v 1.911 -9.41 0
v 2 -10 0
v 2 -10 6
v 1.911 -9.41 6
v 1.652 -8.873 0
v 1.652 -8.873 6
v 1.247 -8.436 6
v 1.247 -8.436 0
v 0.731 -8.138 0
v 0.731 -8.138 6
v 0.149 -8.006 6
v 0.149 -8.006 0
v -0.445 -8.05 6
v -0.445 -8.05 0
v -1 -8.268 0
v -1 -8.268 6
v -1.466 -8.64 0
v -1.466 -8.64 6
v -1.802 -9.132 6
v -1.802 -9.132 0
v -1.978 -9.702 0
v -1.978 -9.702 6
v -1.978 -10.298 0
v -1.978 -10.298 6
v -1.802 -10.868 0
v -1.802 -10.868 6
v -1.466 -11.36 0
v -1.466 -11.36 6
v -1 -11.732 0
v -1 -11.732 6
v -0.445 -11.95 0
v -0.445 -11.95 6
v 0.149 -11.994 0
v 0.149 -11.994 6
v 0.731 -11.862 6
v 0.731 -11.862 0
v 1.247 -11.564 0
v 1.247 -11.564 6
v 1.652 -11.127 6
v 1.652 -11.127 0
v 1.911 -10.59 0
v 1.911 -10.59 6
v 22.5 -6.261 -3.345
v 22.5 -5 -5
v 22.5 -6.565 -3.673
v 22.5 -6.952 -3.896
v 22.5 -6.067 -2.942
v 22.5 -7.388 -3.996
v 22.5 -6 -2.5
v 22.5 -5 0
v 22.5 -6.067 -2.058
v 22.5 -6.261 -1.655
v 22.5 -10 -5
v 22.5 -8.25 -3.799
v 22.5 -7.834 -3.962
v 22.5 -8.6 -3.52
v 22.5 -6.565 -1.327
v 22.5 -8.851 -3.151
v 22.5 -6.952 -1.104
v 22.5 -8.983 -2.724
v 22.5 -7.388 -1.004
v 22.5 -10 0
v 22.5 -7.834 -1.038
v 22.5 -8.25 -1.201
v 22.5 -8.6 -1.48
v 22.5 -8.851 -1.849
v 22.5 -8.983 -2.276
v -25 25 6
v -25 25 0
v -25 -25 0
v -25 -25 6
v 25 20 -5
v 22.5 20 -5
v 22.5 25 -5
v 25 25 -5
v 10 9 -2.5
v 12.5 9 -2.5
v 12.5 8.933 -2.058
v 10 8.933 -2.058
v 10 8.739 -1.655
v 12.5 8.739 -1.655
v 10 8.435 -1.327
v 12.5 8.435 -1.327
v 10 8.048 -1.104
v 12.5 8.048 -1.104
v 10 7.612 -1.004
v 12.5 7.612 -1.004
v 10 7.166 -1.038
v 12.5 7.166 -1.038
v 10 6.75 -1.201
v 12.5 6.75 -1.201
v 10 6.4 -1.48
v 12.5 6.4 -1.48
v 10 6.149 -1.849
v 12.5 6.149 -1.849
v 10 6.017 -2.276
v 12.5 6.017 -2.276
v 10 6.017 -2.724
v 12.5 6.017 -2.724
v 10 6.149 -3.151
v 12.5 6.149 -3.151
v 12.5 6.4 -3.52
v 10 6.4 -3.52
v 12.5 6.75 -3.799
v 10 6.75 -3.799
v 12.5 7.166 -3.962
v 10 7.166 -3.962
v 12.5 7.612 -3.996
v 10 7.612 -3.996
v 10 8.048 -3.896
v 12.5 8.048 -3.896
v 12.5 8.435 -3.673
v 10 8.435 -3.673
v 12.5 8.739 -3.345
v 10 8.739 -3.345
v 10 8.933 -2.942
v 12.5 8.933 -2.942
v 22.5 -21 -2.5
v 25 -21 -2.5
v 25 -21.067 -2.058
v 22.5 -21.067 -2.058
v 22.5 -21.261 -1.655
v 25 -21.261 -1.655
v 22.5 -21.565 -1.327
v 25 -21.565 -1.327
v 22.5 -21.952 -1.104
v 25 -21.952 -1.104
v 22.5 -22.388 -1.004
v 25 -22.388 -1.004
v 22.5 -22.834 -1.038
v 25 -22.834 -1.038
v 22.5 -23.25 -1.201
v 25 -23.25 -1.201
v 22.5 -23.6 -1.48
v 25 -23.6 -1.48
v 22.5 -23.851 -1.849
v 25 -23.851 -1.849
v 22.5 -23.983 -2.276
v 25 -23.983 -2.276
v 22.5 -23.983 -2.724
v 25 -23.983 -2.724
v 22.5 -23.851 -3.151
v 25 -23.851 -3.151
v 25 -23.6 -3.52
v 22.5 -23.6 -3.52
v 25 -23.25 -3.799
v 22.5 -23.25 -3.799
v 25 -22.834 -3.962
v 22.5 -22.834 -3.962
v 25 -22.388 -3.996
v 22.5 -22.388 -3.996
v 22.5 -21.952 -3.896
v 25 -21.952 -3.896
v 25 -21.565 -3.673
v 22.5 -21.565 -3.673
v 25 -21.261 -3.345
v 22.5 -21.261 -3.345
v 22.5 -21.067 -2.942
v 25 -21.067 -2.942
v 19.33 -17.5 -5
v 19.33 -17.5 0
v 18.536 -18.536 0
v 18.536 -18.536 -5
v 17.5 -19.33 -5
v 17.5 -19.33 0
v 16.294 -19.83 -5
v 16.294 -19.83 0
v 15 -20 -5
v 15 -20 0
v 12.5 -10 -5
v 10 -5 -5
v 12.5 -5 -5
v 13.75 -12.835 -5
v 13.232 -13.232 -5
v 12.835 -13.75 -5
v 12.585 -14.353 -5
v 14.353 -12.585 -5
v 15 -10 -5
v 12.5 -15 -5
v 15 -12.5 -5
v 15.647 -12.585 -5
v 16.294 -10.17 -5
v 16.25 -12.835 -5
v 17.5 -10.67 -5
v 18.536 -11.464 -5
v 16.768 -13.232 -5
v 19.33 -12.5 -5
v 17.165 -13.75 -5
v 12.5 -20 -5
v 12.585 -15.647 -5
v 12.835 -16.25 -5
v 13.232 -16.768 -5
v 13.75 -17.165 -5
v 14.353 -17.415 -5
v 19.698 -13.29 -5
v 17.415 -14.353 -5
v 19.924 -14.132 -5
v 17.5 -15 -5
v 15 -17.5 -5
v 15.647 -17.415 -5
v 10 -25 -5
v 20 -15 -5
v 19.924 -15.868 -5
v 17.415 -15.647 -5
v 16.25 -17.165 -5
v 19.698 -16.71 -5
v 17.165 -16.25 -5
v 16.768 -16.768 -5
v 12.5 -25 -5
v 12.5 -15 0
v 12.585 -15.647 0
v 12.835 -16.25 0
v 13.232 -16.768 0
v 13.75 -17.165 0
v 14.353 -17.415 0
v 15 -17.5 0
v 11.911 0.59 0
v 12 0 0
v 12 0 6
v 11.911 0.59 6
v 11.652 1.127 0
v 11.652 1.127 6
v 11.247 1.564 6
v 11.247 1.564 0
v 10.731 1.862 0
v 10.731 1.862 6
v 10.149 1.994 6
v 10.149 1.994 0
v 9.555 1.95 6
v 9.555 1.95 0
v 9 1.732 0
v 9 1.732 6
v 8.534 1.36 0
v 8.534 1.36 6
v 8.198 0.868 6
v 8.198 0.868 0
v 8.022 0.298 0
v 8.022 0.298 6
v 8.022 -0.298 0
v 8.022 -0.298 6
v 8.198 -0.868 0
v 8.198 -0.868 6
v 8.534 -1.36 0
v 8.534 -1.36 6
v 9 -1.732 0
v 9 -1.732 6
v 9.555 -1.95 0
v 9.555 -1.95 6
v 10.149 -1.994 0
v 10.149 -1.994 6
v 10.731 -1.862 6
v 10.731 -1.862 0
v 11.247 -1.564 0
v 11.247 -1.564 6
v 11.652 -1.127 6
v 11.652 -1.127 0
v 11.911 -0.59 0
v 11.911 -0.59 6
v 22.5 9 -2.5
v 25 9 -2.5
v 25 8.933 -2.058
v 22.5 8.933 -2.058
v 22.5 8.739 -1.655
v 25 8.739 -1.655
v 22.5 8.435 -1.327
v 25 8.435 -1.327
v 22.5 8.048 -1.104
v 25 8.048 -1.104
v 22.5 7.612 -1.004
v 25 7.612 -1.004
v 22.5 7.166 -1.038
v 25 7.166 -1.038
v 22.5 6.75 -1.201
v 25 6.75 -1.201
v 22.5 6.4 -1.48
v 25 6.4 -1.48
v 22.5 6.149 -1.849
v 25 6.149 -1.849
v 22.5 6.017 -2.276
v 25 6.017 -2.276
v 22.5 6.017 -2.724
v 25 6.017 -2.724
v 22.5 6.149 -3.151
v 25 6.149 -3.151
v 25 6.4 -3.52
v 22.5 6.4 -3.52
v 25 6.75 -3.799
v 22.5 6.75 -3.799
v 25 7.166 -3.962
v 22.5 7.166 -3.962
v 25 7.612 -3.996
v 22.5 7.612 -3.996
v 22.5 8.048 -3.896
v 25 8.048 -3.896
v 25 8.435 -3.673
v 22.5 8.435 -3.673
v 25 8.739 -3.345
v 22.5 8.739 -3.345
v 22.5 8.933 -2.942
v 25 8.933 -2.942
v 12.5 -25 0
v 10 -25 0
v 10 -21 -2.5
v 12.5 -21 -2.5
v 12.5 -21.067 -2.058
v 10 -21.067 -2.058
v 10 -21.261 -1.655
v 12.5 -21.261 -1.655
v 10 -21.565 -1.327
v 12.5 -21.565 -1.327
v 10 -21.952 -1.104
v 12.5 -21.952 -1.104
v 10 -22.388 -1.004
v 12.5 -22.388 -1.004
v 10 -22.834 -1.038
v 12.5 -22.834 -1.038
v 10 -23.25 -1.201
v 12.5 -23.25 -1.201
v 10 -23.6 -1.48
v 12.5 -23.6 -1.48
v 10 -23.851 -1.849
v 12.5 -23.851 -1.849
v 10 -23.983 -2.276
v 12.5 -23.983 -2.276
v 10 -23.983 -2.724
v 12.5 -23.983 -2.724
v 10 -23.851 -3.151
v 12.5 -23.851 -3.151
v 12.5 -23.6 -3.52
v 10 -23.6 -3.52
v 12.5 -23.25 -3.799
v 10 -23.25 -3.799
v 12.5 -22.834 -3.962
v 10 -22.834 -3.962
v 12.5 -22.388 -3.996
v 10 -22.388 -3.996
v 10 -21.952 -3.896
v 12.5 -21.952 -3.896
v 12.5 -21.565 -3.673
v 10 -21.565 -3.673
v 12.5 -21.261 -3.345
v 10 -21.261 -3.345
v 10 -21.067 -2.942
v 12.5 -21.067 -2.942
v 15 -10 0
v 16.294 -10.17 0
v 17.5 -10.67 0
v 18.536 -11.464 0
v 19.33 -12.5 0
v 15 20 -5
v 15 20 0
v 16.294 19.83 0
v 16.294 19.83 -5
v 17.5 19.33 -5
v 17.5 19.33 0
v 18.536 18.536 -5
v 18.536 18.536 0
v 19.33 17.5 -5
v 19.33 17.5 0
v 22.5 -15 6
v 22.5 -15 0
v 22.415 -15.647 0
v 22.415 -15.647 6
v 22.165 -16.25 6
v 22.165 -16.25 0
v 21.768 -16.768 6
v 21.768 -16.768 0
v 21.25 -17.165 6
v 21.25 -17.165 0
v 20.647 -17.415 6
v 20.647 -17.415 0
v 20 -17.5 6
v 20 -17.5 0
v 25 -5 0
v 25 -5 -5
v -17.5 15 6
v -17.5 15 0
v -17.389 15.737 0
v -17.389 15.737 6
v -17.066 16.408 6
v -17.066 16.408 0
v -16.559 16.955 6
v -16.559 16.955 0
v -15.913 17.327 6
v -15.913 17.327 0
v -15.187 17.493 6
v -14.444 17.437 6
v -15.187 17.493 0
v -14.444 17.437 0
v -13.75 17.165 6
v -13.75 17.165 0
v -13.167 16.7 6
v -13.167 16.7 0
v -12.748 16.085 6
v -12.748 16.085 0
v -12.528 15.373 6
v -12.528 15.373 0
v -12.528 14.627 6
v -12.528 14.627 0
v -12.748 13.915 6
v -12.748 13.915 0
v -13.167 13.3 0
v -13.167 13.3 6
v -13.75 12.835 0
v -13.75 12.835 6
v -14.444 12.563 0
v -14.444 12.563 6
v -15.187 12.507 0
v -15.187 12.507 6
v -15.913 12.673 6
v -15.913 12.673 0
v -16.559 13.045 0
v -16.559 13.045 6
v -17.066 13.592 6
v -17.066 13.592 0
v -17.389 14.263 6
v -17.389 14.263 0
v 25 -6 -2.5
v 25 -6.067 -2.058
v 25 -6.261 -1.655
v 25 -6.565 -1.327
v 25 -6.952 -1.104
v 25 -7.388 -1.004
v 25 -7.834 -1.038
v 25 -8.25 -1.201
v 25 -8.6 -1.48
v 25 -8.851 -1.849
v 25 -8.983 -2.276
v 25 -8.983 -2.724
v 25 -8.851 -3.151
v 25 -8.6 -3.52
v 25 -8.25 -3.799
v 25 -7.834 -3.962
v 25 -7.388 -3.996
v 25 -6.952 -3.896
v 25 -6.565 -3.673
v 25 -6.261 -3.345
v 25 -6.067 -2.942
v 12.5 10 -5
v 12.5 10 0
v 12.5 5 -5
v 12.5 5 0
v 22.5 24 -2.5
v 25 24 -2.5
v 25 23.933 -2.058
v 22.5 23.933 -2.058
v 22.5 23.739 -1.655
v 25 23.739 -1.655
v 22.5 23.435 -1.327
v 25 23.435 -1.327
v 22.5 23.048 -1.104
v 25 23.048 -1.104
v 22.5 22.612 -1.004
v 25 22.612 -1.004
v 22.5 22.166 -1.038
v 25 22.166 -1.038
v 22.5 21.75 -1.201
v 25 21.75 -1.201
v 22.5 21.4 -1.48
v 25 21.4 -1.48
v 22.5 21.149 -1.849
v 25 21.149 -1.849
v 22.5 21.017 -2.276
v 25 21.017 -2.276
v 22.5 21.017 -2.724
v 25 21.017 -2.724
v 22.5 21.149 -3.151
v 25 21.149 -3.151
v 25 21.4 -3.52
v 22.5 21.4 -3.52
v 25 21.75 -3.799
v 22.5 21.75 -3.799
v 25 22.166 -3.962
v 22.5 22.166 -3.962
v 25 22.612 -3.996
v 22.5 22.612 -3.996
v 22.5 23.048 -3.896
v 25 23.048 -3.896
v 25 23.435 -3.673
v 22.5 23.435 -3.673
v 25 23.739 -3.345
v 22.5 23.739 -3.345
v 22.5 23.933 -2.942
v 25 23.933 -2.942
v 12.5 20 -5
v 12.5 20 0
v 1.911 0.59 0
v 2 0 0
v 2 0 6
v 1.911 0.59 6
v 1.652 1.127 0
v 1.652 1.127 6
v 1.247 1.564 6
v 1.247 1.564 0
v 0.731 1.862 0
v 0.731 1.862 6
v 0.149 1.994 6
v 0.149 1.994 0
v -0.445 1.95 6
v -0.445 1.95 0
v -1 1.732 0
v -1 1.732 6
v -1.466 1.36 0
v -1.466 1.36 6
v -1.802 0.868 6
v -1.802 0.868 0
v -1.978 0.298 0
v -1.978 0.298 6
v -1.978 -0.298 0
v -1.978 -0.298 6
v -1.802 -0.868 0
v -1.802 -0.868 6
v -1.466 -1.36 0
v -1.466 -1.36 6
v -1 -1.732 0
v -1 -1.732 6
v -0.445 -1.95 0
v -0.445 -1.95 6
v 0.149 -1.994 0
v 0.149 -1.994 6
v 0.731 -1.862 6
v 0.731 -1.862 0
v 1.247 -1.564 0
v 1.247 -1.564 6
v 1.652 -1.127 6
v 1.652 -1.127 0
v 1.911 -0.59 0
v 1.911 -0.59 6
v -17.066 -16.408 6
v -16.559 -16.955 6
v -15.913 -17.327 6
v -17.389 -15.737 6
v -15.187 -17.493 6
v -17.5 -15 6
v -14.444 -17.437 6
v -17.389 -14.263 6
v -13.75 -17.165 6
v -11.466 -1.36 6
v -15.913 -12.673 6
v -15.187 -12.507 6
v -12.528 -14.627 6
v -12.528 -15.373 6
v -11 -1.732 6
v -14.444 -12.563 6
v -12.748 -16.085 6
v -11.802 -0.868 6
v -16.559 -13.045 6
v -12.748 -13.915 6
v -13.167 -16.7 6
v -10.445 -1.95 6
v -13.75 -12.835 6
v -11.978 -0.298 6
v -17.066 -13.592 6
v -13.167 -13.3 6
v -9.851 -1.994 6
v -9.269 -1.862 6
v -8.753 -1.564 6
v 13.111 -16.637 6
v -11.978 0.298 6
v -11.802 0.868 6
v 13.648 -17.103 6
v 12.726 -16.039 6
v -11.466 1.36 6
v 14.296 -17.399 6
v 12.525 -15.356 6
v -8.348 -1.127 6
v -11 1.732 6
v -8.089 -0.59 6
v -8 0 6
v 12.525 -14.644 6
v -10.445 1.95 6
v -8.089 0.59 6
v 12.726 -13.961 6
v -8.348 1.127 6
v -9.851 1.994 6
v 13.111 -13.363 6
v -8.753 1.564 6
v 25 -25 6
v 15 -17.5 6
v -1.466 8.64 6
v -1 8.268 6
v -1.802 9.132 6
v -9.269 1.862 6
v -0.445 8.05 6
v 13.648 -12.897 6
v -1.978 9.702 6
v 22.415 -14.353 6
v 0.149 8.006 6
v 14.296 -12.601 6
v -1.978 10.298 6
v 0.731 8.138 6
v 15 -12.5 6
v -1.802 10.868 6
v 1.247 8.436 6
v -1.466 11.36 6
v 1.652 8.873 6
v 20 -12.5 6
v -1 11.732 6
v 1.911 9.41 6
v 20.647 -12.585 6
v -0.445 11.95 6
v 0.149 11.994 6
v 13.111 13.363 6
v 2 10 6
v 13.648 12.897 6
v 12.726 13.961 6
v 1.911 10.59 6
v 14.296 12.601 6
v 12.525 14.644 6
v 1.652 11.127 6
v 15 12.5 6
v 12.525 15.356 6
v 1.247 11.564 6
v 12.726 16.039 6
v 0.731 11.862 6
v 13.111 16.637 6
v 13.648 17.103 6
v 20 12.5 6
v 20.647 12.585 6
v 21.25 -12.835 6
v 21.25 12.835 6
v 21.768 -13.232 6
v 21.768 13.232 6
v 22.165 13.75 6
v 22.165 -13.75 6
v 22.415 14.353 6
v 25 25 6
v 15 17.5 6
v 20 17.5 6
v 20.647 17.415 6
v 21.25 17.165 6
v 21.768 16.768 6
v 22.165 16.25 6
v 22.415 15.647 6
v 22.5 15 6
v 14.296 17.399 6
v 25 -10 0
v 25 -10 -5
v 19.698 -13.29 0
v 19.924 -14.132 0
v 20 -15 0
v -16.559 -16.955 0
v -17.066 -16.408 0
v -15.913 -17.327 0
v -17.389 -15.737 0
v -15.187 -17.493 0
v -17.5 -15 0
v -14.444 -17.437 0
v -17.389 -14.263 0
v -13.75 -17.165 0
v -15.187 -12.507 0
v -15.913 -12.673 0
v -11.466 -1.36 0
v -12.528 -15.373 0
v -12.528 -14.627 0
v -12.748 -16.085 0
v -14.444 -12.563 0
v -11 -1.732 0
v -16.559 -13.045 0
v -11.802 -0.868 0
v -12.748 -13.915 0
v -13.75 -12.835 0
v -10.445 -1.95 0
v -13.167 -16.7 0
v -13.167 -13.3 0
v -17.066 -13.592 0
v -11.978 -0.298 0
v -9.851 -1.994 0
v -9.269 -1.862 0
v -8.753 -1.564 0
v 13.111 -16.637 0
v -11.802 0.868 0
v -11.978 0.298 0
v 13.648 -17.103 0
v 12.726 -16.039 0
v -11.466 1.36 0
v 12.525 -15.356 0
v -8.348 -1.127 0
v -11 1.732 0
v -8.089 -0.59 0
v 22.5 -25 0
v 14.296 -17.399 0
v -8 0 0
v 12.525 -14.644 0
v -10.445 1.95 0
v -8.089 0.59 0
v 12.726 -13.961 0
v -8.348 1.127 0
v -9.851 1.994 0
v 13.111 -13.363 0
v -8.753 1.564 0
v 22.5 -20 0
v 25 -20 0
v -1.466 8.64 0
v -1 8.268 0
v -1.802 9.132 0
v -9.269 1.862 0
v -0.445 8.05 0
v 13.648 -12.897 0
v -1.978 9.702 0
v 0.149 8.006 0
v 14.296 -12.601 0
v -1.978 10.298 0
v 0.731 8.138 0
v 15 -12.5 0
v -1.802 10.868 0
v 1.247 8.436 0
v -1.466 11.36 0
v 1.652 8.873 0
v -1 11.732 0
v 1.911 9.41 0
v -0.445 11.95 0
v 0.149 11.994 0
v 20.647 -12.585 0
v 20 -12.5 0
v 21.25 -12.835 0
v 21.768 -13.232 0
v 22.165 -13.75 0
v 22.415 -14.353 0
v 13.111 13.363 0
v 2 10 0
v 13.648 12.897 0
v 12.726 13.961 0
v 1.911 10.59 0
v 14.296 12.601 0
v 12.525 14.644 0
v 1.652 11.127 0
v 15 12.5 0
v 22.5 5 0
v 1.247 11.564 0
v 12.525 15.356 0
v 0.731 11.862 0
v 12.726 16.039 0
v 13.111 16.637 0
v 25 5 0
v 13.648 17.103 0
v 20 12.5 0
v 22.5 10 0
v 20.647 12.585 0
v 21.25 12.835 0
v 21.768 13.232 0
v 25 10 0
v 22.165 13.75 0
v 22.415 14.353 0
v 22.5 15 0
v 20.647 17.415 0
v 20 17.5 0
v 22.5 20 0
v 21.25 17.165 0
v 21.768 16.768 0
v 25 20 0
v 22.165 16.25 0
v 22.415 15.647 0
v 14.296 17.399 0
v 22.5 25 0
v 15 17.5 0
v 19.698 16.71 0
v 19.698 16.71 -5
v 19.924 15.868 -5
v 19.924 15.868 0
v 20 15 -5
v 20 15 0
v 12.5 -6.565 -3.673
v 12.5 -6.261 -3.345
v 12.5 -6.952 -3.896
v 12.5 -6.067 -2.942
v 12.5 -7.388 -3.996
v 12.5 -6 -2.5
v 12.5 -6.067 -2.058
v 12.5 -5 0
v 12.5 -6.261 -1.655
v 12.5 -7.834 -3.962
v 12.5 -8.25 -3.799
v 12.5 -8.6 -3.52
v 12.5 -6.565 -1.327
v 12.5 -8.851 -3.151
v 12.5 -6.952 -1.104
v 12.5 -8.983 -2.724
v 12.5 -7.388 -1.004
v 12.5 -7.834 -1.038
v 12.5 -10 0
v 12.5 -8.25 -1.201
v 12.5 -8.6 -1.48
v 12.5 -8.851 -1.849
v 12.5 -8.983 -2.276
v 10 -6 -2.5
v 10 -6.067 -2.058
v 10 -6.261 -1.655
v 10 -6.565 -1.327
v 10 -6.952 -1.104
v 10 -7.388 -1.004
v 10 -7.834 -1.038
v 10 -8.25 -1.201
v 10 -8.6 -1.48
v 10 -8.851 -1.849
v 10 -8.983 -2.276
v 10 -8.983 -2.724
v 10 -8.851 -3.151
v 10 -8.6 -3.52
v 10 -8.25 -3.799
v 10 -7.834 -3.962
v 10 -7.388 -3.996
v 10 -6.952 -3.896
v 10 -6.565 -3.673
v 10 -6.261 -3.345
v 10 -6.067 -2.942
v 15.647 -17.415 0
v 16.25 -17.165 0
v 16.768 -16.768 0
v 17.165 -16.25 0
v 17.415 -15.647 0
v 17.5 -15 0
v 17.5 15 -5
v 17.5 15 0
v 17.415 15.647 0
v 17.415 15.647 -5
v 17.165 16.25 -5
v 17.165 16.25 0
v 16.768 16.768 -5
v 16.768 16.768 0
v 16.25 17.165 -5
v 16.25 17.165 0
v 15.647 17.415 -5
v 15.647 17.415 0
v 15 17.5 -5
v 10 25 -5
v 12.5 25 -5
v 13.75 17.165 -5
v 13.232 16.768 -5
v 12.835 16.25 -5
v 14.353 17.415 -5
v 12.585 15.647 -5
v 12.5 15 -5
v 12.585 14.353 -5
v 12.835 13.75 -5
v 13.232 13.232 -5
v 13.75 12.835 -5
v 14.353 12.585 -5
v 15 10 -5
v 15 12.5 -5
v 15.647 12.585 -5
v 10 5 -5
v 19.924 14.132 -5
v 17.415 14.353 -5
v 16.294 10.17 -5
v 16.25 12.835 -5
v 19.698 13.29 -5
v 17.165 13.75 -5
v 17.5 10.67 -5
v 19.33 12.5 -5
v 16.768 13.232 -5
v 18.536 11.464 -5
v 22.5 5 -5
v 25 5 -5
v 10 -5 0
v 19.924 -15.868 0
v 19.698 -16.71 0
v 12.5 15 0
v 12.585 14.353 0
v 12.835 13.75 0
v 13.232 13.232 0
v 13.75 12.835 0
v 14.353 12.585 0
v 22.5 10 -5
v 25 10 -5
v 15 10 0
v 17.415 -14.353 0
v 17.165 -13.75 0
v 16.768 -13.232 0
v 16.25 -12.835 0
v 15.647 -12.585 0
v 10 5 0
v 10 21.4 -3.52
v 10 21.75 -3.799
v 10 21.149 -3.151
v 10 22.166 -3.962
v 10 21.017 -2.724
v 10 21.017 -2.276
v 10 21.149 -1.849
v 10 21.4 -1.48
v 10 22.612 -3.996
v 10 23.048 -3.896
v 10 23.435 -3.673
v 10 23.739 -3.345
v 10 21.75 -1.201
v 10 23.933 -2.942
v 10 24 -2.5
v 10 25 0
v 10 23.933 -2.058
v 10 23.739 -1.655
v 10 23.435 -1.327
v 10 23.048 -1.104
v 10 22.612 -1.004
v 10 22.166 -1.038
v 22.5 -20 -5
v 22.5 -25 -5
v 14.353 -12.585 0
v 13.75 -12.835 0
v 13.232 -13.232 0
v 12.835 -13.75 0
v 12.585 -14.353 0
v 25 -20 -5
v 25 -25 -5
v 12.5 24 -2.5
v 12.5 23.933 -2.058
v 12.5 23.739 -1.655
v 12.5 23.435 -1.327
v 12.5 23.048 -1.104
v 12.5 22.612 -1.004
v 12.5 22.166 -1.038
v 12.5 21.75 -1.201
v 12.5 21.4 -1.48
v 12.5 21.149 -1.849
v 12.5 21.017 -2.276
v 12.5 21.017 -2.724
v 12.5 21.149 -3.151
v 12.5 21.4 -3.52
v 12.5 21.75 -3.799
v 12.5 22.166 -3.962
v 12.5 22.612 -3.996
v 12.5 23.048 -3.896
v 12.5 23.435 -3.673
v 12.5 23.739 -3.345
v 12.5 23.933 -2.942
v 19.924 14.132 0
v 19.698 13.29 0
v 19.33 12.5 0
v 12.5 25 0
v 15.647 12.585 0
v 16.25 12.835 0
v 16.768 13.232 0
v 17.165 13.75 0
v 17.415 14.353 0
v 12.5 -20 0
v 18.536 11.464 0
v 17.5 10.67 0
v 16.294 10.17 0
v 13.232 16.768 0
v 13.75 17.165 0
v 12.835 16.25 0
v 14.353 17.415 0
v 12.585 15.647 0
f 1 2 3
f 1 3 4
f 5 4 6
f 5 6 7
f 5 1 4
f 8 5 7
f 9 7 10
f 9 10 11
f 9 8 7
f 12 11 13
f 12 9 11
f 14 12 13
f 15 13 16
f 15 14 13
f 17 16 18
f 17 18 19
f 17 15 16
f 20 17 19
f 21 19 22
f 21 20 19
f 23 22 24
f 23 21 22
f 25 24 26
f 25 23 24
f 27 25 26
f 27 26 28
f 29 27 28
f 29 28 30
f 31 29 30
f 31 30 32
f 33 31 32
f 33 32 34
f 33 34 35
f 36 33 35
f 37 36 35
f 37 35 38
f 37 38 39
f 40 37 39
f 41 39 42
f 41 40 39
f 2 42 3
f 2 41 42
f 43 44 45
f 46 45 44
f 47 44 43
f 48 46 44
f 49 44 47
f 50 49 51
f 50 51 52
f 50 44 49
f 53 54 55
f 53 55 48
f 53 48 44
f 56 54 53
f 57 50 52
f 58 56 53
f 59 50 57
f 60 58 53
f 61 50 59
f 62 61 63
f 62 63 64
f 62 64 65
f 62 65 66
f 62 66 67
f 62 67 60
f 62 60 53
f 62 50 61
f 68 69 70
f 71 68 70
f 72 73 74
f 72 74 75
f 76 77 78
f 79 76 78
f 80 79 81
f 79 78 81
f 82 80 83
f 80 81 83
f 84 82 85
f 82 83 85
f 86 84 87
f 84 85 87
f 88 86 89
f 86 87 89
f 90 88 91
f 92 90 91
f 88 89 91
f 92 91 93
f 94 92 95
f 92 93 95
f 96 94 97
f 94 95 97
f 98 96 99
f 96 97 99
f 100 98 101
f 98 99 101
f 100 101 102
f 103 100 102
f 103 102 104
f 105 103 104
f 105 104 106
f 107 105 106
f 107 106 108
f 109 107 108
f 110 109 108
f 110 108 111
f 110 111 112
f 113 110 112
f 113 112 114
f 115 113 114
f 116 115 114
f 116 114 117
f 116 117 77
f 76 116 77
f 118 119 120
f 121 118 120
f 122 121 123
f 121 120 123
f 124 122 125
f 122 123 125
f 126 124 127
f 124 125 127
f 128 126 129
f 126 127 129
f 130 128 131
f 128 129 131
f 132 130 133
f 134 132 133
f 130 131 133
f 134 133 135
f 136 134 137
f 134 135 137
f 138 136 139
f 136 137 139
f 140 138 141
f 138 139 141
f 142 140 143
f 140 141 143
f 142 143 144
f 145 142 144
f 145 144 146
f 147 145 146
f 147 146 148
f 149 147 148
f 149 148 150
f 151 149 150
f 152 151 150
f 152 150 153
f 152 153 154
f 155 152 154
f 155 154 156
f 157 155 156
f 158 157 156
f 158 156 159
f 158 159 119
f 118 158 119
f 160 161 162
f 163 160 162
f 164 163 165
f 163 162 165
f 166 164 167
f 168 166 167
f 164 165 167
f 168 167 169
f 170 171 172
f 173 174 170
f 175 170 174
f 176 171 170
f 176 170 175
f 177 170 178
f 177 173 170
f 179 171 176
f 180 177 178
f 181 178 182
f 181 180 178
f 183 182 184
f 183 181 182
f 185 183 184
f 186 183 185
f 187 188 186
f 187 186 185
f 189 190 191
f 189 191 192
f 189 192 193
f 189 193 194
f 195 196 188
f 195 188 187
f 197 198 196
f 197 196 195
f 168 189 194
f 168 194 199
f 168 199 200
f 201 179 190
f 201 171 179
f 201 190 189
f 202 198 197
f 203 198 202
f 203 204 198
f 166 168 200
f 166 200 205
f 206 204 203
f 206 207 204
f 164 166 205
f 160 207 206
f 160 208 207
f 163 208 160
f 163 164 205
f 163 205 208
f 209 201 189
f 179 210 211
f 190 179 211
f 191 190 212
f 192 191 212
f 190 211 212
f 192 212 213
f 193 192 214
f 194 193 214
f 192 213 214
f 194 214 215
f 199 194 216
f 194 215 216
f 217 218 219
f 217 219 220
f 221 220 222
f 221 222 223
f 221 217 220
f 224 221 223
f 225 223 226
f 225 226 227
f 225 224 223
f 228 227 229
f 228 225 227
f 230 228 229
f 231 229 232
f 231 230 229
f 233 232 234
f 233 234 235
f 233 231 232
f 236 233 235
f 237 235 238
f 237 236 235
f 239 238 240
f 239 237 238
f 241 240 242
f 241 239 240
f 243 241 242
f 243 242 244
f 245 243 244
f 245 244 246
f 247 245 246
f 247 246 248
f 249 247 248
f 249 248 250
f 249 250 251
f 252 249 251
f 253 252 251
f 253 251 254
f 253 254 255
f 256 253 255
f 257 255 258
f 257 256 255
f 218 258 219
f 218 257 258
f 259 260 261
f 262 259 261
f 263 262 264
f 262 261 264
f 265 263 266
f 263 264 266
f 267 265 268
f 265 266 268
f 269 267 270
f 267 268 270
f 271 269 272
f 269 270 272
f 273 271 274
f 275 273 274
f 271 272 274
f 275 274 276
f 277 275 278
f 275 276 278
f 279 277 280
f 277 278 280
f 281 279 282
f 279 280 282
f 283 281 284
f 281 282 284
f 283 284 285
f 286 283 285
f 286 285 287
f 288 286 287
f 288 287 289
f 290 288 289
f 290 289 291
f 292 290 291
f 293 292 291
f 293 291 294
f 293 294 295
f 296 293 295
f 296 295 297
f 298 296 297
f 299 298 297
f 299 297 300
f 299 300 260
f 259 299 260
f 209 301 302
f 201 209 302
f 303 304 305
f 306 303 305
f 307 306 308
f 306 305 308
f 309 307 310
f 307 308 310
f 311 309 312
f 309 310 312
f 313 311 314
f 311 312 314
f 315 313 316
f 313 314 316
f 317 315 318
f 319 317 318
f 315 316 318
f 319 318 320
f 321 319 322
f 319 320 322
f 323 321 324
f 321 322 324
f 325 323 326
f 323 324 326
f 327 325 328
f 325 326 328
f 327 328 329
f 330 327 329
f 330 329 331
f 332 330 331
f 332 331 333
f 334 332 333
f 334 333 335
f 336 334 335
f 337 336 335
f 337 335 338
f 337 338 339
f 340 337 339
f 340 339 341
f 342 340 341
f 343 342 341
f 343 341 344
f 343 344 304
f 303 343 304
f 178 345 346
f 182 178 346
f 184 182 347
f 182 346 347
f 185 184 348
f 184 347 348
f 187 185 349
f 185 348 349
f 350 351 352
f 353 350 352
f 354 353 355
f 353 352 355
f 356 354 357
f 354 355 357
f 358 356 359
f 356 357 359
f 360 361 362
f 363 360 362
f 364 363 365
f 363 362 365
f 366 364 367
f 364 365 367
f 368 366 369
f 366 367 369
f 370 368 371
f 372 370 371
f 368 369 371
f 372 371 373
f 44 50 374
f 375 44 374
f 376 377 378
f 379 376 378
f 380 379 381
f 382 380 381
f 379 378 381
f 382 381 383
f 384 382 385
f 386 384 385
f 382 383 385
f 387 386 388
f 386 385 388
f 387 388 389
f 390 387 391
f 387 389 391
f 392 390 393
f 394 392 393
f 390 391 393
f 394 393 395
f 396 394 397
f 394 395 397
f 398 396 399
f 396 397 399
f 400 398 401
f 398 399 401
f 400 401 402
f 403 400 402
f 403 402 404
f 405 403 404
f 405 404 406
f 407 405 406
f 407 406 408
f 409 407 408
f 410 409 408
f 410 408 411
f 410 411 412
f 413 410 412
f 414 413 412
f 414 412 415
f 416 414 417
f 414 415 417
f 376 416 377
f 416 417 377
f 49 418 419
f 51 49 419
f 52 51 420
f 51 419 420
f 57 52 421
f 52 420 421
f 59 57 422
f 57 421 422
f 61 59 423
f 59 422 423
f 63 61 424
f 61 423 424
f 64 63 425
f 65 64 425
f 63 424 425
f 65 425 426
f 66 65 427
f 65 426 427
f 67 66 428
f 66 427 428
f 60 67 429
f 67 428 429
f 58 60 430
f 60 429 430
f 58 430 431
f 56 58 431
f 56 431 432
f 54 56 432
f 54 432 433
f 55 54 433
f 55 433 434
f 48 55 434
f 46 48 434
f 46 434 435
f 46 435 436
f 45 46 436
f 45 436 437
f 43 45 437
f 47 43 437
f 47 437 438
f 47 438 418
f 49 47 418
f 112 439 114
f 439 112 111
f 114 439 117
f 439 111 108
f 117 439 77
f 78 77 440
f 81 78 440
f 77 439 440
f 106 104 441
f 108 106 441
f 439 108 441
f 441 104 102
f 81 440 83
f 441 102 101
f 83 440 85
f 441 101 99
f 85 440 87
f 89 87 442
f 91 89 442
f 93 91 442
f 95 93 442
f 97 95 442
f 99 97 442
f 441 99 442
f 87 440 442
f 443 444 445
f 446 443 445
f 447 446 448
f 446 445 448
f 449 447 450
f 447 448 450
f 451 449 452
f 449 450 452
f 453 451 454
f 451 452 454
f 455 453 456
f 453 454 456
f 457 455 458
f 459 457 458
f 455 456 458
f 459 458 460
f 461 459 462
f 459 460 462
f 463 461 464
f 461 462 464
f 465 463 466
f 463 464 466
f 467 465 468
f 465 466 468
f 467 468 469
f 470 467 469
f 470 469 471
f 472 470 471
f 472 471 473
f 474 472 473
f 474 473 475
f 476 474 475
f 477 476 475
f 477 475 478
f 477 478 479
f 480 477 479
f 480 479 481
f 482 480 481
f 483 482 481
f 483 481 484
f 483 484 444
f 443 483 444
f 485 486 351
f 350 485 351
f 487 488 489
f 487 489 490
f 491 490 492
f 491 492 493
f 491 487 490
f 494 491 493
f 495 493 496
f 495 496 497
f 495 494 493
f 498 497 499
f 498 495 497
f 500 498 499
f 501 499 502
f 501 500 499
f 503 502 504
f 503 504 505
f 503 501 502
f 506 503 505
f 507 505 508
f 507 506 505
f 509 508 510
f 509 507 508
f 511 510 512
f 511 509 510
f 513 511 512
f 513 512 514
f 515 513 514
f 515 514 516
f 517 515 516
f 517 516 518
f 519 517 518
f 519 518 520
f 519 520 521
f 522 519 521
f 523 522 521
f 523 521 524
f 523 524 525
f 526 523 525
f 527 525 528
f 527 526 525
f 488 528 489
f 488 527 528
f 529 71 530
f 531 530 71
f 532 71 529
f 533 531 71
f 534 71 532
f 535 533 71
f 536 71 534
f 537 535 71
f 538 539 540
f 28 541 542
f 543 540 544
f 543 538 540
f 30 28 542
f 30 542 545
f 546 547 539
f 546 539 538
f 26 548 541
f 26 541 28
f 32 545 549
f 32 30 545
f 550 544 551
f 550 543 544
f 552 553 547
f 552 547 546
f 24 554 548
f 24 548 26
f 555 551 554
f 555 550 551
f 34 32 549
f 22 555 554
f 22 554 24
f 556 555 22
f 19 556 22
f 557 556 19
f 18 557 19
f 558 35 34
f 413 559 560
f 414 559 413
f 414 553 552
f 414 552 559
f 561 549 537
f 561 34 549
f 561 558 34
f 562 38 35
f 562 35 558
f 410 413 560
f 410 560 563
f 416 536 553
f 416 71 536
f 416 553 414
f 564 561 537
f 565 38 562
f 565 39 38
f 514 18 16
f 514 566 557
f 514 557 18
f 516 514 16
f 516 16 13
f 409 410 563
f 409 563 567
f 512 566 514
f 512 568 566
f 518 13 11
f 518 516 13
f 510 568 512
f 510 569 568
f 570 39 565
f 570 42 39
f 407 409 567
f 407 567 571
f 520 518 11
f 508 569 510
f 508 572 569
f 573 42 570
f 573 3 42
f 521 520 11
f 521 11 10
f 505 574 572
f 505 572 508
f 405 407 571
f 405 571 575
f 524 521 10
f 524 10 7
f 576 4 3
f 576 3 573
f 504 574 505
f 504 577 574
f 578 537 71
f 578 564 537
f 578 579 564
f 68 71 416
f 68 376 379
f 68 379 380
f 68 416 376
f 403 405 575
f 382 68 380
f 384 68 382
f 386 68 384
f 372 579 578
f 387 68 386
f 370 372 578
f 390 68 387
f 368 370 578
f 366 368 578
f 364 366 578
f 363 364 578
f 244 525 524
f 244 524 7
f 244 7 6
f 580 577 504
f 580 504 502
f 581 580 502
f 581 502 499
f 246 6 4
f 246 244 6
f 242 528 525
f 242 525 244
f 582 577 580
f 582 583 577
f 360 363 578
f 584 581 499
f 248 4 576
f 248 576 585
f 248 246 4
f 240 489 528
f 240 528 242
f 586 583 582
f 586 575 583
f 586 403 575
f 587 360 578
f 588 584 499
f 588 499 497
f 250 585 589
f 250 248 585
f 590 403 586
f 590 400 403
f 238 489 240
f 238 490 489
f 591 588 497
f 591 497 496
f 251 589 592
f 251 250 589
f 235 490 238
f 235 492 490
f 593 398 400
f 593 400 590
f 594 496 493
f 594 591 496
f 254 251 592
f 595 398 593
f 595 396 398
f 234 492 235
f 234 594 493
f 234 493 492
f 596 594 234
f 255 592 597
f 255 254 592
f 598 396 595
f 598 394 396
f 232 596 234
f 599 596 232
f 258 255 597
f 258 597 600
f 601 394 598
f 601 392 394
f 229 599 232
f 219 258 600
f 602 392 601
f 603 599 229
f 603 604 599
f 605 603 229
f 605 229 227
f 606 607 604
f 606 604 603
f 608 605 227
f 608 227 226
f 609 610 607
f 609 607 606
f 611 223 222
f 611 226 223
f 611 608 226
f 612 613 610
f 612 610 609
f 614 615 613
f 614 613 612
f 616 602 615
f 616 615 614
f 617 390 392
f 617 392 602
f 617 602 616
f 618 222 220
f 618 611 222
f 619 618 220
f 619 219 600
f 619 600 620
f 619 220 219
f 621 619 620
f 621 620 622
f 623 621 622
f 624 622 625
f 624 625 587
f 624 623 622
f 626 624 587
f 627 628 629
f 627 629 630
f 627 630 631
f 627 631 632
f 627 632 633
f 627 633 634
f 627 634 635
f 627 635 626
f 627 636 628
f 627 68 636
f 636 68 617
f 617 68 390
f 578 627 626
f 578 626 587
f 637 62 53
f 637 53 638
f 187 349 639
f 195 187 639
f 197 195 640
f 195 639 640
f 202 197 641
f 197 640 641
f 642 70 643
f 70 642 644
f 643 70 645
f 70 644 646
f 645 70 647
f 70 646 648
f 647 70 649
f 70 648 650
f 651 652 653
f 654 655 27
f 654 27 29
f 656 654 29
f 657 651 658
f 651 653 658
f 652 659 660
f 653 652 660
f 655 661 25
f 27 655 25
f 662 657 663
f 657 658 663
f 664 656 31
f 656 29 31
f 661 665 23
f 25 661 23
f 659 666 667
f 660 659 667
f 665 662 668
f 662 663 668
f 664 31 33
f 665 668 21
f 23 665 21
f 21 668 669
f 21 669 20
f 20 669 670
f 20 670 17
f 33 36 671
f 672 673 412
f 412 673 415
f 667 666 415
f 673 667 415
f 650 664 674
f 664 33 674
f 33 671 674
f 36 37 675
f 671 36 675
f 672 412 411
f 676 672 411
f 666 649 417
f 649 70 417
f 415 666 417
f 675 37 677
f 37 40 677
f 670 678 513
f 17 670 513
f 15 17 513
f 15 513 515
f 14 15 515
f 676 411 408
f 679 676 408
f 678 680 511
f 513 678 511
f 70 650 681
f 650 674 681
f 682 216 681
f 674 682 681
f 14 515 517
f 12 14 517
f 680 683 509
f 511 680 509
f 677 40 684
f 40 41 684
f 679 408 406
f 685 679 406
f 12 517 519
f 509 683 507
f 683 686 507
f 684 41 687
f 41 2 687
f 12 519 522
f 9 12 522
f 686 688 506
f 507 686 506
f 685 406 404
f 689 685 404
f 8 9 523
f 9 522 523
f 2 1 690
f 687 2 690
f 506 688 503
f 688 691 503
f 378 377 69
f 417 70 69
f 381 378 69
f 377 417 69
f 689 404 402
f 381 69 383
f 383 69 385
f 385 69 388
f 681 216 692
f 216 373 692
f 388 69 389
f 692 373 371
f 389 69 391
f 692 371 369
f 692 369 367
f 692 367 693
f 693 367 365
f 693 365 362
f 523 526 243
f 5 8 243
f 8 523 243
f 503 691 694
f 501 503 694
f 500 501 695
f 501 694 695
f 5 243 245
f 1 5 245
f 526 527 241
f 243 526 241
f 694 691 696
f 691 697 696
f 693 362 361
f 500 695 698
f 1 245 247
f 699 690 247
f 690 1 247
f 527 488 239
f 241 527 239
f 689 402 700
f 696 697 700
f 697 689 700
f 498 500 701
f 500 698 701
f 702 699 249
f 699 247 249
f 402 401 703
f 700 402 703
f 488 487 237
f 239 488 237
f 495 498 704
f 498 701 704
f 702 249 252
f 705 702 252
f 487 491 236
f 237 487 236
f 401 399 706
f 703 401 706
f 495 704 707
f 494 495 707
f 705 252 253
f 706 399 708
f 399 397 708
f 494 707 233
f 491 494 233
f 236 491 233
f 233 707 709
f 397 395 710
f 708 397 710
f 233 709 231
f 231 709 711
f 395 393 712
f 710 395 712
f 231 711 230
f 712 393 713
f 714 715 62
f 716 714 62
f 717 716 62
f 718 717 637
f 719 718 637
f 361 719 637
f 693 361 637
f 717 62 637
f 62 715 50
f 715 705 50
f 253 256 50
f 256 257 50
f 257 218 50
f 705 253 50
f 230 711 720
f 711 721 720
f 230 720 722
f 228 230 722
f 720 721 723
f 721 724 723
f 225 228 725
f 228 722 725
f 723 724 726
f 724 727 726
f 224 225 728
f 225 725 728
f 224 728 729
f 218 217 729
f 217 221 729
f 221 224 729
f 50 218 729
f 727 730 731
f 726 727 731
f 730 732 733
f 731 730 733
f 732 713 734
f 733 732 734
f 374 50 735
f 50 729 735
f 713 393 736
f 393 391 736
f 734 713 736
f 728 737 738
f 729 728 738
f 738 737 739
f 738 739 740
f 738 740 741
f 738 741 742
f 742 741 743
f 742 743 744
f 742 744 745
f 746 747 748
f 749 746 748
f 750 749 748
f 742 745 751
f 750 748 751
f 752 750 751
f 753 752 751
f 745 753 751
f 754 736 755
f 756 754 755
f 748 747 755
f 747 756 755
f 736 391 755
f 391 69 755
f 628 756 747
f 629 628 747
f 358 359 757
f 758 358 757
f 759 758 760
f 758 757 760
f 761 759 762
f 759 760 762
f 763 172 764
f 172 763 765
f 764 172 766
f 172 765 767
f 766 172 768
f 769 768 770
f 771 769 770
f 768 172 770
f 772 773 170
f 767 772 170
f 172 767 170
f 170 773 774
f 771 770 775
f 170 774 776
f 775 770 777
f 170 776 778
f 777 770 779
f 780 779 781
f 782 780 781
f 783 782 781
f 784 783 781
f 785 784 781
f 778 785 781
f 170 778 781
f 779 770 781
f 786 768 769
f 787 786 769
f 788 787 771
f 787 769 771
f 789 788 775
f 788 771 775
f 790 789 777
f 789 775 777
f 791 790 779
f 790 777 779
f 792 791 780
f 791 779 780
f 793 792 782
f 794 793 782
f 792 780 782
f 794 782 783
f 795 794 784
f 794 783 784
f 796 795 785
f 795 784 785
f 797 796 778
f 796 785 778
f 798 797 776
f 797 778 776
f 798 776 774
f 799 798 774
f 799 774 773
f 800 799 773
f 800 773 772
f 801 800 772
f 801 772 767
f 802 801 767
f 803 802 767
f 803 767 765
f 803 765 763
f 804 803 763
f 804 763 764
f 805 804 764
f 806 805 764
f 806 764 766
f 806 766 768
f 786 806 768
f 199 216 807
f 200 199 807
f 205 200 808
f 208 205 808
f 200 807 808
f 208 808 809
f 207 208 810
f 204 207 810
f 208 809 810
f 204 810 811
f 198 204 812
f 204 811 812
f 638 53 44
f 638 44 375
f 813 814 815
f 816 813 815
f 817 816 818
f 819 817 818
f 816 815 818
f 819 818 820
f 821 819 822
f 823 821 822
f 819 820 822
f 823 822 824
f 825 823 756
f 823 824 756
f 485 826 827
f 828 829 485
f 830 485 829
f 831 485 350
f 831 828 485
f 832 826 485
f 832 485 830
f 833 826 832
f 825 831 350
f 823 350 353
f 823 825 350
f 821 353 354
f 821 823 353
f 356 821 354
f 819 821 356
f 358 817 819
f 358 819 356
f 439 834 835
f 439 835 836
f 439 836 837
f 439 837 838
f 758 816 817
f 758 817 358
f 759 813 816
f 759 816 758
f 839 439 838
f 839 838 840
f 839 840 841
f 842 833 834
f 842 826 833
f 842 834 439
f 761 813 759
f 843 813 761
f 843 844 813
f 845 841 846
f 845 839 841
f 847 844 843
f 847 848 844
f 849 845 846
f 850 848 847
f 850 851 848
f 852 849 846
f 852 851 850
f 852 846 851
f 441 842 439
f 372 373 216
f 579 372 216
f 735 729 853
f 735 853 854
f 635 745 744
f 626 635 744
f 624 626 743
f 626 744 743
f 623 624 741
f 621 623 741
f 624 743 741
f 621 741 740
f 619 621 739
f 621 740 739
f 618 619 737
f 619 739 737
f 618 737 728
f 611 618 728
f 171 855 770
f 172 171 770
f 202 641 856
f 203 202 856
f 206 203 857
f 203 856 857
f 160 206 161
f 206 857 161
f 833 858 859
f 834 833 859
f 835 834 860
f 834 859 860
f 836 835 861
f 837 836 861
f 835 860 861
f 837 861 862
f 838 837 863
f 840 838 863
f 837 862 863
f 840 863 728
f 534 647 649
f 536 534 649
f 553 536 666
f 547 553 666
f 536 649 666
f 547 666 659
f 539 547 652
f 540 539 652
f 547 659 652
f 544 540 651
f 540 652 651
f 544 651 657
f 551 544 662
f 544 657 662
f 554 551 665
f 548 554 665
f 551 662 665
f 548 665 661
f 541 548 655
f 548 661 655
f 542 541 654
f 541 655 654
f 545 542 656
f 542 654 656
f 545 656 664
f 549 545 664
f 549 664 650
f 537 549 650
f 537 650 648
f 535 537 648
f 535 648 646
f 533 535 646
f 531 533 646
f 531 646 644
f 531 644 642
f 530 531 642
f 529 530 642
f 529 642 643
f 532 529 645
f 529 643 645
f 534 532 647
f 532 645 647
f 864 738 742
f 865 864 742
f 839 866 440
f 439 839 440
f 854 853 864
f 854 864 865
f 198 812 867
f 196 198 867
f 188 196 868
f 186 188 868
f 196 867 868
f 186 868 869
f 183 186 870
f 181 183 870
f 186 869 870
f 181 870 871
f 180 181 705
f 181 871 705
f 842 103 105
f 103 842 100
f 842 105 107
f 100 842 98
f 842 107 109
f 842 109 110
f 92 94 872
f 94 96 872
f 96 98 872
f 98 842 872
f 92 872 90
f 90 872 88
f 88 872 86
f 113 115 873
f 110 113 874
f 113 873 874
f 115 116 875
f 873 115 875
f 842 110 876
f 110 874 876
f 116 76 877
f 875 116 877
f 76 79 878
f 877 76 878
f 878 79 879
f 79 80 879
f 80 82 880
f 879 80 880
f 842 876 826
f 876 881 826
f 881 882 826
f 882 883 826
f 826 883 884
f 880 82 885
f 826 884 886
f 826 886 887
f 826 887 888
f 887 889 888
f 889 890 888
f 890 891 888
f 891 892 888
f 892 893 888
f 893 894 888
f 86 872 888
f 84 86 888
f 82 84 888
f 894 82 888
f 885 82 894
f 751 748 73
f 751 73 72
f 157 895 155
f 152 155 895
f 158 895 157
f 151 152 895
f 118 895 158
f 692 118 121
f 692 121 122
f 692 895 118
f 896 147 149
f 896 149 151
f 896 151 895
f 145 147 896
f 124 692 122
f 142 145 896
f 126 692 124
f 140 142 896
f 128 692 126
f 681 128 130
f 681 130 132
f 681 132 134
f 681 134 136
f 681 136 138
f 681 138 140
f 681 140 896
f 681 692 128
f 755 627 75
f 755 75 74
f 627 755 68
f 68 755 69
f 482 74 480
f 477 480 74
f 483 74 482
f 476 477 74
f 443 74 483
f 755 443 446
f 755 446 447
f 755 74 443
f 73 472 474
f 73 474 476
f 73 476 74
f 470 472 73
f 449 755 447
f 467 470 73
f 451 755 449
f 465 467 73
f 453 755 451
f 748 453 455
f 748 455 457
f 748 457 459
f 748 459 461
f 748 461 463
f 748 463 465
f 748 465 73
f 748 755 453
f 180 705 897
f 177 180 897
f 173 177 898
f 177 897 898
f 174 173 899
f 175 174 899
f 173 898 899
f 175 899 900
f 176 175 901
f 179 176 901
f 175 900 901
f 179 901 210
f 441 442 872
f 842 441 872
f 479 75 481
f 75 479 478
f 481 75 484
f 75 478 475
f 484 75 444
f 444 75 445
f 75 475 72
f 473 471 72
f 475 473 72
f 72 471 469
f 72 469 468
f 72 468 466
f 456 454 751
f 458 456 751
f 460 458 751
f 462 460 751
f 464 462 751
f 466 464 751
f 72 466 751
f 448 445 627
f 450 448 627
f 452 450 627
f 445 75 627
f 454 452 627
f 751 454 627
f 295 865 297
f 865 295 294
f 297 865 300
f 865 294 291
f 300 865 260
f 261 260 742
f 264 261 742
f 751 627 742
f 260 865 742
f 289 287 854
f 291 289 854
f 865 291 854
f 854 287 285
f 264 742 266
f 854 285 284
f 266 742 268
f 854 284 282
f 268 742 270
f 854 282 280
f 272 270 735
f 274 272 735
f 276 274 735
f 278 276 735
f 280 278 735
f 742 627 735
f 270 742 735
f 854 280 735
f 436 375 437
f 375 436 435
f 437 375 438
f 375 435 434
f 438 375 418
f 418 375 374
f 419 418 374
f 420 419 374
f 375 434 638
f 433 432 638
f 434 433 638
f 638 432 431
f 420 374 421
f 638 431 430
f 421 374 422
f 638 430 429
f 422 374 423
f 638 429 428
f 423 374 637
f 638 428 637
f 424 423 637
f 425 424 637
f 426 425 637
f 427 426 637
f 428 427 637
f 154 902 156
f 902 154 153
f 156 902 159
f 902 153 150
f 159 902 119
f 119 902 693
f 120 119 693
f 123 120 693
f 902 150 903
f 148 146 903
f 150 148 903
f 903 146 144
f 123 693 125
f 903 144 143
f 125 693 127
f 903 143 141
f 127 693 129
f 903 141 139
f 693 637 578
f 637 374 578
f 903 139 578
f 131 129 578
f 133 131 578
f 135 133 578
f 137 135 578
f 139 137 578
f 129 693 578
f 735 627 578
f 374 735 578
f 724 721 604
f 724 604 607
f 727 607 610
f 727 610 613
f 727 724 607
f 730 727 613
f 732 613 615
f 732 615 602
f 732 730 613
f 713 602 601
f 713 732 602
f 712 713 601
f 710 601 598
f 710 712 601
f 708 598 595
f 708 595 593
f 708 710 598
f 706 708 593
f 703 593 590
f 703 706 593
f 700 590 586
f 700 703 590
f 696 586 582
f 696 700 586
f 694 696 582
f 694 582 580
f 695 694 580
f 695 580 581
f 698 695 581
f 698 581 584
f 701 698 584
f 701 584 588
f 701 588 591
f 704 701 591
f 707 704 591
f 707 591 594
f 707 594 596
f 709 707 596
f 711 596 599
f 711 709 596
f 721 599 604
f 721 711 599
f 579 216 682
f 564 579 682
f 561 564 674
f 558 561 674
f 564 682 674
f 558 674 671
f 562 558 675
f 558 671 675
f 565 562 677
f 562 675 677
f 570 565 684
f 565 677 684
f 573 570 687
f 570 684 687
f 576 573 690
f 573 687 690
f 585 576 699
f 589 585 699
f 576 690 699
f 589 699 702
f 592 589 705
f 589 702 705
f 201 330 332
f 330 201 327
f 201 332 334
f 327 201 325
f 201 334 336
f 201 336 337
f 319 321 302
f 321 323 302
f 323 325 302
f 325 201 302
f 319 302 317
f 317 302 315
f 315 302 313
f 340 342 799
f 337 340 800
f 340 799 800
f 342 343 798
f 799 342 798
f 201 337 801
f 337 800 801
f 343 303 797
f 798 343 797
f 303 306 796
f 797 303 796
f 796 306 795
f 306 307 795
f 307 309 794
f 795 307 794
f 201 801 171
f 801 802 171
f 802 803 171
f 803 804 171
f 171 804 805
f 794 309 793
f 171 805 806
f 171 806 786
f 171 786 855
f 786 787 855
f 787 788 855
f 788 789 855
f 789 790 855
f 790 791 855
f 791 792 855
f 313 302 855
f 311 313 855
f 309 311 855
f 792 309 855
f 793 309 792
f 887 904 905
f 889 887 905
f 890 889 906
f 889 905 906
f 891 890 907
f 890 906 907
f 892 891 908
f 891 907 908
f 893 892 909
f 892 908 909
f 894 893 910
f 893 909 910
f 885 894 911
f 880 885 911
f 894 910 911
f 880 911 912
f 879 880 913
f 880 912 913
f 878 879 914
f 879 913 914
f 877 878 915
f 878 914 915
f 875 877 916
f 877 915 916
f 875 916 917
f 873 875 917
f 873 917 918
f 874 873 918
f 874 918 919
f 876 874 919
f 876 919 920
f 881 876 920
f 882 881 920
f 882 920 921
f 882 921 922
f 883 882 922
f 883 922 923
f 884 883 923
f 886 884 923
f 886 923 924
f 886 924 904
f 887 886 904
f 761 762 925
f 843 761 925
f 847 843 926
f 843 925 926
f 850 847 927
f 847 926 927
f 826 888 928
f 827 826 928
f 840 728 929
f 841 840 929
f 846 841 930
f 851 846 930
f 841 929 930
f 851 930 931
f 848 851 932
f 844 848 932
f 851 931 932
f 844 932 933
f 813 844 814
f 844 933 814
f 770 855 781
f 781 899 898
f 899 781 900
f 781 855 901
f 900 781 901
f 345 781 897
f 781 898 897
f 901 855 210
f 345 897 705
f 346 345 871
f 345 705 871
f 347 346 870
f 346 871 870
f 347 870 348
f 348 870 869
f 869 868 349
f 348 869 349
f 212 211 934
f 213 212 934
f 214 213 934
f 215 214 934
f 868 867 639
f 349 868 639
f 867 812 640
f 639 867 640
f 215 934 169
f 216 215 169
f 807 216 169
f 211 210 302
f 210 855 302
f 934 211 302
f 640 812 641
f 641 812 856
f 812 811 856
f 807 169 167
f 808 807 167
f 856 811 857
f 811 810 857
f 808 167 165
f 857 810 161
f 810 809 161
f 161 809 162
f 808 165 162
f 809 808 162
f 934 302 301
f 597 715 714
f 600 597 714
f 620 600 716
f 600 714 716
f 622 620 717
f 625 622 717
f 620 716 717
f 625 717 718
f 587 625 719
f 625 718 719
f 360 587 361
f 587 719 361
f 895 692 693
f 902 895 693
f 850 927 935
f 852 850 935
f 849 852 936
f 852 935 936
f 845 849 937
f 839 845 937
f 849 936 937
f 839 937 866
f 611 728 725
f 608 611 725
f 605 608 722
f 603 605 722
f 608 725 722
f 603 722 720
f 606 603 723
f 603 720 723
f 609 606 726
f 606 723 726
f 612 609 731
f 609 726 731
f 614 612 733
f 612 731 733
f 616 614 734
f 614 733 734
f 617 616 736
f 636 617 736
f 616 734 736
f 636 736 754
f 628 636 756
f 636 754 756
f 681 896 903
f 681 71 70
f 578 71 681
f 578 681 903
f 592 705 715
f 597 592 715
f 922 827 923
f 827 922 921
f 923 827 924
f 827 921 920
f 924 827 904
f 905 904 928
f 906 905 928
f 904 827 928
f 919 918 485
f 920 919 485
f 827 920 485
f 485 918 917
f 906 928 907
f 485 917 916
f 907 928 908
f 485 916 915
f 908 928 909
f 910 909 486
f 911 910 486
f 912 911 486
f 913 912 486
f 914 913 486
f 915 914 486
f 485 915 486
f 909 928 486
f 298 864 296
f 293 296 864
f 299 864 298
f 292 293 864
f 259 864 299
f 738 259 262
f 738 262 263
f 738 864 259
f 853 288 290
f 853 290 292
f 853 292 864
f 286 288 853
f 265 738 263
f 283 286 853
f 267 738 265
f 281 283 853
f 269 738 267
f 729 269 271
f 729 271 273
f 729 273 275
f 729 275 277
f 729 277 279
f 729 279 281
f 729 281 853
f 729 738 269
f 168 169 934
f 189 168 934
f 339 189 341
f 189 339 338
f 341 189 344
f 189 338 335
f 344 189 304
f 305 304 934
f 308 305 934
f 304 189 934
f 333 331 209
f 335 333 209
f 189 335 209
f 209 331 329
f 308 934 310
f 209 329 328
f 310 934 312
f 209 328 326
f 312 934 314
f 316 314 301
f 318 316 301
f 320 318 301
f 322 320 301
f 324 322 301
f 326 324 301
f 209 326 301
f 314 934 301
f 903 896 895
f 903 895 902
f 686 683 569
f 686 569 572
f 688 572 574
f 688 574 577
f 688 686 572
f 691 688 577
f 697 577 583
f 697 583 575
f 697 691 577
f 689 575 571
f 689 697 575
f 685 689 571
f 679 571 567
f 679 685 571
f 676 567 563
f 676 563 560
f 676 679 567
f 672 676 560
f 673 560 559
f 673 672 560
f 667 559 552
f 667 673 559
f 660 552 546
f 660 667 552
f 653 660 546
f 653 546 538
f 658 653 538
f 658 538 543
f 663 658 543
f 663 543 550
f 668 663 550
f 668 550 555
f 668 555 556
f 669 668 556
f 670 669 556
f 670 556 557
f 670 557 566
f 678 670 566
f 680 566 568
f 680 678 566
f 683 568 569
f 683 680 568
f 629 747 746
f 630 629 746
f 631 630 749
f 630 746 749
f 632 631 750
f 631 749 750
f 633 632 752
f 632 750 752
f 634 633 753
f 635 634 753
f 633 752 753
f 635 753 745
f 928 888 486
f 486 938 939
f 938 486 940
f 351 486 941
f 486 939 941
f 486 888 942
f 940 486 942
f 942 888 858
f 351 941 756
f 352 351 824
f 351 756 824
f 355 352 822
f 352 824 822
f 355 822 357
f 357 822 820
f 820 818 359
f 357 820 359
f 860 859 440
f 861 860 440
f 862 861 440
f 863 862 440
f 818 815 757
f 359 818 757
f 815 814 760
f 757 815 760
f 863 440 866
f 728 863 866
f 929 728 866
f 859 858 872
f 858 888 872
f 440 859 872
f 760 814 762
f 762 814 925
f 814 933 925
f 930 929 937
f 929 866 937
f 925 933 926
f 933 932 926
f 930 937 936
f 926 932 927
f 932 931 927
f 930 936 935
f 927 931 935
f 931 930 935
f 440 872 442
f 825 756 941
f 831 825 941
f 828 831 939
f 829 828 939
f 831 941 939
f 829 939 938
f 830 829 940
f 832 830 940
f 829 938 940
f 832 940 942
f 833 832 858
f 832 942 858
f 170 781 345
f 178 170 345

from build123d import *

# Parameters (mm, degrees)
F0_R             = 2
F1_DEPTH         = 6
F2_W             = 2.5
F2_H             = 5
F3_DEPTH         = 5
F5_DEPTH         = 5
F8_D             = 3
F8_DEPTH         = 40
F8_TIP           = 0.9012909285
F8_2_D           = 3
F8_2_DEPTH       = 40
F8_2_TIP         = 0.9012909285
F8_ON_F6_D       = 3
F8_ON_F6_DEPTH   = 40
F8_ON_F6_TIP     = 0.9012909285
F8_ON_F6_2_D     = 3
F8_ON_F6_2_DEPTH = 40
F8_ON_F6_2_TIP   = 0.9012909285


with BuildPart() as f1:
    # F0 (on Top) → F1 (new body)
    with BuildSketch(Plane.XY):
        Polygon((25, 15), (25, 25), (-25, 25), (-25, 15), (-25, -15), (-25, -25), (25, -25), (25, -15), align=None)
        with BuildLine():
            ThreePointArc((-12.5, -15), (-15, -17.5), (-17.5, -15))
            ThreePointArc((-17.5, -15), (-15, -12.5), (-12.5, -15))
        make_face(mode=Mode.SUBTRACT)
        with BuildLine():
            ThreePointArc((20, -12.5), (21.767766953, -13.232233047), (22.5, -15))
            ThreePointArc((22.5, -15), (21.767766953, -16.767766953), (20, -17.5))
            Line((20, -17.5), (15, -17.5))
            ThreePointArc((15, -17.5), (12.5, -15), (15, -12.5))
            Line((15, -12.5), (20, -12.5))
        make_face(mode=Mode.SUBTRACT)
        with Locations((0, -10)):
            Circle(F0_R, mode=Mode.SUBTRACT)
        with Locations((-10, 0)):
            Circle(F0_R, mode=Mode.SUBTRACT)
        with BuildLine():
            ThreePointArc((-12.5, 15), (-15, 12.5), (-17.5, 15))
            ThreePointArc((-17.5, 15), (-15, 17.5), (-12.5, 15))
        make_face(mode=Mode.SUBTRACT)
        Circle(F0_R, mode=Mode.SUBTRACT)
        with Locations((10, 0)):
            Circle(F0_R, mode=Mode.SUBTRACT)
        with Locations((0, 10)):
            Circle(F0_R, mode=Mode.SUBTRACT)
        with BuildLine():
            ThreePointArc((20, 17.5), (21.767766953, 16.767766953), (22.5, 15))
            ThreePointArc((22.5, 15), (21.767766953, 13.232233047), (20, 12.5))
            Line((20, 12.5), (15, 12.5))
            ThreePointArc((15, 12.5), (12.5, 15), (15, 17.5))
            Line((15, 17.5), (20, 17.5))
        make_face(mode=Mode.SUBTRACT)
    extrude(amount=F1_DEPTH)

    # F2 (on face) → F3 (join)
    with BuildSketch(Plane(origin=(0, 0, 0), x_dir=(1, 0, 0), z_dir=(0, 0, -1))):
        with Locations((23.75, 22.5)):
            Rectangle(F2_W, F2_H)
        with Locations((23.75, 7.5)):
            Rectangle(F2_W, F2_H)
        with Locations((23.75, -7.5)):
            Rectangle(F2_W, F2_H)
        with Locations((23.75, -22.5)):
            Rectangle(F2_W, F2_H)
    extrude(amount=F3_DEPTH)

    # F8
    with Locations(Plane(origin=(10, 0, 0), x_dir=(0, -1, 0), z_dir=(-1, 0, 0))):
        with Locations((-7.5, -2.5), (-22.5, -2.5)):
            Hole(F8_D / 2, depth=F8_DEPTH)
            with Locations((0, 0, -(F8_DEPTH + F8_TIP / 2))):  # 118° drill point
                Cone(0, F8_D / 2, F8_TIP, mode=Mode.SUBTRACT)

    # F8 on F6
    with Locations(Plane(origin=(10, 0, 0), x_dir=(0, -1, 0), z_dir=(-1, 0, 0))):
        with Locations((7.5, -2.5), (22.5, -2.5)):
            Hole(F8_ON_F6_D / 2, depth=F8_ON_F6_DEPTH)
            with Locations((0, 0, -(F8_ON_F6_DEPTH + F8_ON_F6_TIP / 2))):  # 118° drill point
                Cone(0, F8_ON_F6_D / 2, F8_ON_F6_TIP, mode=Mode.SUBTRACT)


with BuildPart() as f5:
    # F4 (on face) → F5 (new body)
    with BuildSketch(Plane(origin=(0, 0, 0), x_dir=(1, 0, 0), z_dir=(0, 0, -1))):
        with BuildLine():
            Line((12.5, 19.3301270189), (12.5, 20))
            Line((12.5, 20), (12.5, 25))
            Line((12.5, 25), (10, 25))
            Line((10, 25), (10, 15))
            ThreePointArc((10, 15), (10.6698729811, 17.5), (12.5, 19.3301270189))
        make_face()
        with BuildLine():
            Line((15, 20), (12.5, 20))
            Line((12.5, 20), (12.5, 19.3301270189))
            ThreePointArc((12.5, 19.3301270189), (13.7059047745, 19.8296291314), (15, 20))
        make_face()
        with BuildLine():
            ThreePointArc((15, 20), (13.7059047745, 19.8296291314), (12.5, 19.3301270189))
            Line((12.5, 19.3301270189), (12.5, 15))
            ThreePointArc((12.5, 15), (13.232233047, 16.767766953), (15, 17.5))
            Line((15, 17.5), (19.3301270189, 17.5))
            ThreePointArc((19.3301270189, 17.5), (17.5, 19.3301270189), (15, 20))
        make_face()
        with BuildLine():
            Line((12.5, 15), (12.5, 19.3301270189))
            ThreePointArc((12.5, 19.3301270189), (10.6698729811, 17.5), (10, 15))
            ThreePointArc((10, 15), (10.6698729811, 12.5), (12.5, 10.6698729811))
            Line((12.5, 10.6698729811), (12.5, 15))
        make_face()
        with BuildLine():
            ThreePointArc((15, 12.5), (13.232233047, 13.232233047), (12.5, 15))
            Line((12.5, 15), (12.5, 10.6698729811))
            ThreePointArc((12.5, 10.6698729811), (13.7059047745, 10.1703708686), (15, 10))
            ThreePointArc((15, 10), (17.5, 10.6698729811), (19.3301270189, 12.5))
            Line((19.3301270189, 12.5), (15, 12.5))
        make_face()
        with BuildLine():
            ThreePointArc((12.5, 10.6698729811), (10.6698729811, 12.5), (10, 15))
            Line((10, 15), (10, 5))
            Line((10, 5), (12.5, 5))
            Line((12.5, 5), (12.5, 10))
            Line((12.5, 10), (12.5, 10.6698729811))
        make_face()
        with BuildLine():
            ThreePointArc((20, 15), (19.8296291314, 16.2940952255), (19.3301270189, 17.5))
            Line((19.3301270189, 17.5), (15, 17.5))
            ThreePointArc((15, 17.5), (16.767766953, 16.767766953), (17.5, 15))
            ThreePointArc((17.5, 15), (16.767766953, 13.232233047), (15, 12.5))
            Line((15, 12.5), (19.3301270189, 12.5))
            ThreePointArc((19.3301270189, 12.5), (19.8296291314, 13.7059047745), (20, 15))
        make_face()
        with BuildLine():
            ThreePointArc((15, 10), (13.7059047745, 10.1703708686), (12.5, 10.6698729811))
            Line((12.5, 10.6698729811), (12.5, 10))
            Line((12.5, 10), (15, 10))
        make_face()
    extrude(amount=F5_DEPTH)

    # F8 on F6#2
    with Locations(Plane(origin=(10, 0, 0), x_dir=(0, -1, 0), z_dir=(-1, 0, 0))):
        with Locations((7.5, -2.5), (22.5, -2.5)):
            Hole(F8_ON_F6_2_D / 2, depth=F8_ON_F6_2_DEPTH)
            with Locations((0, 0, -(F8_ON_F6_2_DEPTH + F8_ON_F6_2_TIP / 2))):  # 118° drill point
                Cone(0, F8_ON_F6_2_D / 2, F8_ON_F6_2_TIP, mode=Mode.SUBTRACT)


with BuildPart() as f5b:
    # F4 (on face) → F5, piece 2 (new body)
    with BuildSketch(Plane(origin=(0, 0, 0), x_dir=(1, 0, 0), z_dir=(0, 0, -1))):
        with BuildLine():
            Line((10, -15), (10, -25))
            Line((10, -25), (12.5, -25))
            Line((12.5, -25), (12.5, -20))
            Line((12.5, -20), (12.5, -19.3301270189))
            ThreePointArc((12.5, -19.3301270189), (10.6698729811, -17.5), (10, -15))
        make_face()
        with BuildLine():
            Line((12.5, -10), (12.5, -5))
            Line((12.5, -5), (10, -5))
            Line((10, -5), (10, -15))
            ThreePointArc((10, -15), (10.6698729811, -12.5), (12.5, -10.6698729811))
            Line((12.5, -10.6698729811), (12.5, -10))
        make_face()
        with BuildLine():
            ThreePointArc((12.5, -10.6698729811), (10.6698729811, -12.5), (10, -15))
            ThreePointArc((10, -15), (10.6698729811, -17.5), (12.5, -19.3301270189))
            Line((12.5, -19.3301270189), (12.5, -15))
            Line((12.5, -15), (12.5, -10.6698729811))
        make_face()
        with BuildLine():
            Line((15, -10), (12.5, -10))
            Line((12.5, -10), (12.5, -10.6698729811))
            ThreePointArc((12.5, -10.6698729811), (13.7059047745, -10.1703708686), (15, -10))
        make_face()
        with BuildLine():
            ThreePointArc((15, -10), (13.7059047745, -10.1703708686), (12.5, -10.6698729811))
            Line((12.5, -10.6698729811), (12.5, -15))
            ThreePointArc((12.5, -15), (13.232233047, -13.232233047), (15, -12.5))
            Line((15, -12.5), (19.3301270189, -12.5))
            ThreePointArc((19.3301270189, -12.5), (17.5, -10.6698729811), (15, -10))
        make_face()
        with BuildLine():
            ThreePointArc((15, -20), (13.7059047745, -19.8296291314), (12.5, -19.3301270189))
            Line((12.5, -19.3301270189), (12.5, -20))
            Line((12.5, -20), (15, -20))
        make_face()
        with BuildLine():
            Line((12.5, -15), (12.5, -19.3301270189))
            ThreePointArc((12.5, -19.3301270189), (13.7059047745, -19.8296291314), (15, -20))
            ThreePointArc((15, -20), (17.5, -19.3301270189), (19.3301270189, -17.5))
            Line((19.3301270189, -17.5), (15, -17.5))
            ThreePointArc((15, -17.5), (13.232233047, -16.767766953), (12.5, -15))
        make_face()
        with BuildLine():
            ThreePointArc((20, -15), (19.8296291314, -13.7059047745), (19.3301270189, -12.5))
            Line((19.3301270189, -12.5), (15, -12.5))
            ThreePointArc((15, -12.5), (16.767766953, -13.232233047), (17.5, -15))
            ThreePointArc((17.5, -15), (16.767766953, -16.767766953), (15, -17.5))
            Line((15, -17.5), (19.3301270189, -17.5))
            ThreePointArc((19.3301270189, -17.5), (19.8296291314, -16.2940952255), (20, -15))
        make_face()
    extrude(amount=F5_DEPTH)

    # F8#2
    with Locations(Plane(origin=(10, 0, 0), x_dir=(0, -1, 0), z_dir=(-1, 0, 0))):
        with Locations((-7.5, -2.5), (-22.5, -2.5)):
            Hole(F8_2_D / 2, depth=F8_2_DEPTH)
            with Locations((0, 0, -(F8_2_DEPTH + F8_2_TIP / 2))):  # 118° drill point
                Cone(0, F8_2_D / 2, F8_2_TIP, mode=Mode.SUBTRACT)


solid = Compound([f1.part, f5.part, f5b.part])
